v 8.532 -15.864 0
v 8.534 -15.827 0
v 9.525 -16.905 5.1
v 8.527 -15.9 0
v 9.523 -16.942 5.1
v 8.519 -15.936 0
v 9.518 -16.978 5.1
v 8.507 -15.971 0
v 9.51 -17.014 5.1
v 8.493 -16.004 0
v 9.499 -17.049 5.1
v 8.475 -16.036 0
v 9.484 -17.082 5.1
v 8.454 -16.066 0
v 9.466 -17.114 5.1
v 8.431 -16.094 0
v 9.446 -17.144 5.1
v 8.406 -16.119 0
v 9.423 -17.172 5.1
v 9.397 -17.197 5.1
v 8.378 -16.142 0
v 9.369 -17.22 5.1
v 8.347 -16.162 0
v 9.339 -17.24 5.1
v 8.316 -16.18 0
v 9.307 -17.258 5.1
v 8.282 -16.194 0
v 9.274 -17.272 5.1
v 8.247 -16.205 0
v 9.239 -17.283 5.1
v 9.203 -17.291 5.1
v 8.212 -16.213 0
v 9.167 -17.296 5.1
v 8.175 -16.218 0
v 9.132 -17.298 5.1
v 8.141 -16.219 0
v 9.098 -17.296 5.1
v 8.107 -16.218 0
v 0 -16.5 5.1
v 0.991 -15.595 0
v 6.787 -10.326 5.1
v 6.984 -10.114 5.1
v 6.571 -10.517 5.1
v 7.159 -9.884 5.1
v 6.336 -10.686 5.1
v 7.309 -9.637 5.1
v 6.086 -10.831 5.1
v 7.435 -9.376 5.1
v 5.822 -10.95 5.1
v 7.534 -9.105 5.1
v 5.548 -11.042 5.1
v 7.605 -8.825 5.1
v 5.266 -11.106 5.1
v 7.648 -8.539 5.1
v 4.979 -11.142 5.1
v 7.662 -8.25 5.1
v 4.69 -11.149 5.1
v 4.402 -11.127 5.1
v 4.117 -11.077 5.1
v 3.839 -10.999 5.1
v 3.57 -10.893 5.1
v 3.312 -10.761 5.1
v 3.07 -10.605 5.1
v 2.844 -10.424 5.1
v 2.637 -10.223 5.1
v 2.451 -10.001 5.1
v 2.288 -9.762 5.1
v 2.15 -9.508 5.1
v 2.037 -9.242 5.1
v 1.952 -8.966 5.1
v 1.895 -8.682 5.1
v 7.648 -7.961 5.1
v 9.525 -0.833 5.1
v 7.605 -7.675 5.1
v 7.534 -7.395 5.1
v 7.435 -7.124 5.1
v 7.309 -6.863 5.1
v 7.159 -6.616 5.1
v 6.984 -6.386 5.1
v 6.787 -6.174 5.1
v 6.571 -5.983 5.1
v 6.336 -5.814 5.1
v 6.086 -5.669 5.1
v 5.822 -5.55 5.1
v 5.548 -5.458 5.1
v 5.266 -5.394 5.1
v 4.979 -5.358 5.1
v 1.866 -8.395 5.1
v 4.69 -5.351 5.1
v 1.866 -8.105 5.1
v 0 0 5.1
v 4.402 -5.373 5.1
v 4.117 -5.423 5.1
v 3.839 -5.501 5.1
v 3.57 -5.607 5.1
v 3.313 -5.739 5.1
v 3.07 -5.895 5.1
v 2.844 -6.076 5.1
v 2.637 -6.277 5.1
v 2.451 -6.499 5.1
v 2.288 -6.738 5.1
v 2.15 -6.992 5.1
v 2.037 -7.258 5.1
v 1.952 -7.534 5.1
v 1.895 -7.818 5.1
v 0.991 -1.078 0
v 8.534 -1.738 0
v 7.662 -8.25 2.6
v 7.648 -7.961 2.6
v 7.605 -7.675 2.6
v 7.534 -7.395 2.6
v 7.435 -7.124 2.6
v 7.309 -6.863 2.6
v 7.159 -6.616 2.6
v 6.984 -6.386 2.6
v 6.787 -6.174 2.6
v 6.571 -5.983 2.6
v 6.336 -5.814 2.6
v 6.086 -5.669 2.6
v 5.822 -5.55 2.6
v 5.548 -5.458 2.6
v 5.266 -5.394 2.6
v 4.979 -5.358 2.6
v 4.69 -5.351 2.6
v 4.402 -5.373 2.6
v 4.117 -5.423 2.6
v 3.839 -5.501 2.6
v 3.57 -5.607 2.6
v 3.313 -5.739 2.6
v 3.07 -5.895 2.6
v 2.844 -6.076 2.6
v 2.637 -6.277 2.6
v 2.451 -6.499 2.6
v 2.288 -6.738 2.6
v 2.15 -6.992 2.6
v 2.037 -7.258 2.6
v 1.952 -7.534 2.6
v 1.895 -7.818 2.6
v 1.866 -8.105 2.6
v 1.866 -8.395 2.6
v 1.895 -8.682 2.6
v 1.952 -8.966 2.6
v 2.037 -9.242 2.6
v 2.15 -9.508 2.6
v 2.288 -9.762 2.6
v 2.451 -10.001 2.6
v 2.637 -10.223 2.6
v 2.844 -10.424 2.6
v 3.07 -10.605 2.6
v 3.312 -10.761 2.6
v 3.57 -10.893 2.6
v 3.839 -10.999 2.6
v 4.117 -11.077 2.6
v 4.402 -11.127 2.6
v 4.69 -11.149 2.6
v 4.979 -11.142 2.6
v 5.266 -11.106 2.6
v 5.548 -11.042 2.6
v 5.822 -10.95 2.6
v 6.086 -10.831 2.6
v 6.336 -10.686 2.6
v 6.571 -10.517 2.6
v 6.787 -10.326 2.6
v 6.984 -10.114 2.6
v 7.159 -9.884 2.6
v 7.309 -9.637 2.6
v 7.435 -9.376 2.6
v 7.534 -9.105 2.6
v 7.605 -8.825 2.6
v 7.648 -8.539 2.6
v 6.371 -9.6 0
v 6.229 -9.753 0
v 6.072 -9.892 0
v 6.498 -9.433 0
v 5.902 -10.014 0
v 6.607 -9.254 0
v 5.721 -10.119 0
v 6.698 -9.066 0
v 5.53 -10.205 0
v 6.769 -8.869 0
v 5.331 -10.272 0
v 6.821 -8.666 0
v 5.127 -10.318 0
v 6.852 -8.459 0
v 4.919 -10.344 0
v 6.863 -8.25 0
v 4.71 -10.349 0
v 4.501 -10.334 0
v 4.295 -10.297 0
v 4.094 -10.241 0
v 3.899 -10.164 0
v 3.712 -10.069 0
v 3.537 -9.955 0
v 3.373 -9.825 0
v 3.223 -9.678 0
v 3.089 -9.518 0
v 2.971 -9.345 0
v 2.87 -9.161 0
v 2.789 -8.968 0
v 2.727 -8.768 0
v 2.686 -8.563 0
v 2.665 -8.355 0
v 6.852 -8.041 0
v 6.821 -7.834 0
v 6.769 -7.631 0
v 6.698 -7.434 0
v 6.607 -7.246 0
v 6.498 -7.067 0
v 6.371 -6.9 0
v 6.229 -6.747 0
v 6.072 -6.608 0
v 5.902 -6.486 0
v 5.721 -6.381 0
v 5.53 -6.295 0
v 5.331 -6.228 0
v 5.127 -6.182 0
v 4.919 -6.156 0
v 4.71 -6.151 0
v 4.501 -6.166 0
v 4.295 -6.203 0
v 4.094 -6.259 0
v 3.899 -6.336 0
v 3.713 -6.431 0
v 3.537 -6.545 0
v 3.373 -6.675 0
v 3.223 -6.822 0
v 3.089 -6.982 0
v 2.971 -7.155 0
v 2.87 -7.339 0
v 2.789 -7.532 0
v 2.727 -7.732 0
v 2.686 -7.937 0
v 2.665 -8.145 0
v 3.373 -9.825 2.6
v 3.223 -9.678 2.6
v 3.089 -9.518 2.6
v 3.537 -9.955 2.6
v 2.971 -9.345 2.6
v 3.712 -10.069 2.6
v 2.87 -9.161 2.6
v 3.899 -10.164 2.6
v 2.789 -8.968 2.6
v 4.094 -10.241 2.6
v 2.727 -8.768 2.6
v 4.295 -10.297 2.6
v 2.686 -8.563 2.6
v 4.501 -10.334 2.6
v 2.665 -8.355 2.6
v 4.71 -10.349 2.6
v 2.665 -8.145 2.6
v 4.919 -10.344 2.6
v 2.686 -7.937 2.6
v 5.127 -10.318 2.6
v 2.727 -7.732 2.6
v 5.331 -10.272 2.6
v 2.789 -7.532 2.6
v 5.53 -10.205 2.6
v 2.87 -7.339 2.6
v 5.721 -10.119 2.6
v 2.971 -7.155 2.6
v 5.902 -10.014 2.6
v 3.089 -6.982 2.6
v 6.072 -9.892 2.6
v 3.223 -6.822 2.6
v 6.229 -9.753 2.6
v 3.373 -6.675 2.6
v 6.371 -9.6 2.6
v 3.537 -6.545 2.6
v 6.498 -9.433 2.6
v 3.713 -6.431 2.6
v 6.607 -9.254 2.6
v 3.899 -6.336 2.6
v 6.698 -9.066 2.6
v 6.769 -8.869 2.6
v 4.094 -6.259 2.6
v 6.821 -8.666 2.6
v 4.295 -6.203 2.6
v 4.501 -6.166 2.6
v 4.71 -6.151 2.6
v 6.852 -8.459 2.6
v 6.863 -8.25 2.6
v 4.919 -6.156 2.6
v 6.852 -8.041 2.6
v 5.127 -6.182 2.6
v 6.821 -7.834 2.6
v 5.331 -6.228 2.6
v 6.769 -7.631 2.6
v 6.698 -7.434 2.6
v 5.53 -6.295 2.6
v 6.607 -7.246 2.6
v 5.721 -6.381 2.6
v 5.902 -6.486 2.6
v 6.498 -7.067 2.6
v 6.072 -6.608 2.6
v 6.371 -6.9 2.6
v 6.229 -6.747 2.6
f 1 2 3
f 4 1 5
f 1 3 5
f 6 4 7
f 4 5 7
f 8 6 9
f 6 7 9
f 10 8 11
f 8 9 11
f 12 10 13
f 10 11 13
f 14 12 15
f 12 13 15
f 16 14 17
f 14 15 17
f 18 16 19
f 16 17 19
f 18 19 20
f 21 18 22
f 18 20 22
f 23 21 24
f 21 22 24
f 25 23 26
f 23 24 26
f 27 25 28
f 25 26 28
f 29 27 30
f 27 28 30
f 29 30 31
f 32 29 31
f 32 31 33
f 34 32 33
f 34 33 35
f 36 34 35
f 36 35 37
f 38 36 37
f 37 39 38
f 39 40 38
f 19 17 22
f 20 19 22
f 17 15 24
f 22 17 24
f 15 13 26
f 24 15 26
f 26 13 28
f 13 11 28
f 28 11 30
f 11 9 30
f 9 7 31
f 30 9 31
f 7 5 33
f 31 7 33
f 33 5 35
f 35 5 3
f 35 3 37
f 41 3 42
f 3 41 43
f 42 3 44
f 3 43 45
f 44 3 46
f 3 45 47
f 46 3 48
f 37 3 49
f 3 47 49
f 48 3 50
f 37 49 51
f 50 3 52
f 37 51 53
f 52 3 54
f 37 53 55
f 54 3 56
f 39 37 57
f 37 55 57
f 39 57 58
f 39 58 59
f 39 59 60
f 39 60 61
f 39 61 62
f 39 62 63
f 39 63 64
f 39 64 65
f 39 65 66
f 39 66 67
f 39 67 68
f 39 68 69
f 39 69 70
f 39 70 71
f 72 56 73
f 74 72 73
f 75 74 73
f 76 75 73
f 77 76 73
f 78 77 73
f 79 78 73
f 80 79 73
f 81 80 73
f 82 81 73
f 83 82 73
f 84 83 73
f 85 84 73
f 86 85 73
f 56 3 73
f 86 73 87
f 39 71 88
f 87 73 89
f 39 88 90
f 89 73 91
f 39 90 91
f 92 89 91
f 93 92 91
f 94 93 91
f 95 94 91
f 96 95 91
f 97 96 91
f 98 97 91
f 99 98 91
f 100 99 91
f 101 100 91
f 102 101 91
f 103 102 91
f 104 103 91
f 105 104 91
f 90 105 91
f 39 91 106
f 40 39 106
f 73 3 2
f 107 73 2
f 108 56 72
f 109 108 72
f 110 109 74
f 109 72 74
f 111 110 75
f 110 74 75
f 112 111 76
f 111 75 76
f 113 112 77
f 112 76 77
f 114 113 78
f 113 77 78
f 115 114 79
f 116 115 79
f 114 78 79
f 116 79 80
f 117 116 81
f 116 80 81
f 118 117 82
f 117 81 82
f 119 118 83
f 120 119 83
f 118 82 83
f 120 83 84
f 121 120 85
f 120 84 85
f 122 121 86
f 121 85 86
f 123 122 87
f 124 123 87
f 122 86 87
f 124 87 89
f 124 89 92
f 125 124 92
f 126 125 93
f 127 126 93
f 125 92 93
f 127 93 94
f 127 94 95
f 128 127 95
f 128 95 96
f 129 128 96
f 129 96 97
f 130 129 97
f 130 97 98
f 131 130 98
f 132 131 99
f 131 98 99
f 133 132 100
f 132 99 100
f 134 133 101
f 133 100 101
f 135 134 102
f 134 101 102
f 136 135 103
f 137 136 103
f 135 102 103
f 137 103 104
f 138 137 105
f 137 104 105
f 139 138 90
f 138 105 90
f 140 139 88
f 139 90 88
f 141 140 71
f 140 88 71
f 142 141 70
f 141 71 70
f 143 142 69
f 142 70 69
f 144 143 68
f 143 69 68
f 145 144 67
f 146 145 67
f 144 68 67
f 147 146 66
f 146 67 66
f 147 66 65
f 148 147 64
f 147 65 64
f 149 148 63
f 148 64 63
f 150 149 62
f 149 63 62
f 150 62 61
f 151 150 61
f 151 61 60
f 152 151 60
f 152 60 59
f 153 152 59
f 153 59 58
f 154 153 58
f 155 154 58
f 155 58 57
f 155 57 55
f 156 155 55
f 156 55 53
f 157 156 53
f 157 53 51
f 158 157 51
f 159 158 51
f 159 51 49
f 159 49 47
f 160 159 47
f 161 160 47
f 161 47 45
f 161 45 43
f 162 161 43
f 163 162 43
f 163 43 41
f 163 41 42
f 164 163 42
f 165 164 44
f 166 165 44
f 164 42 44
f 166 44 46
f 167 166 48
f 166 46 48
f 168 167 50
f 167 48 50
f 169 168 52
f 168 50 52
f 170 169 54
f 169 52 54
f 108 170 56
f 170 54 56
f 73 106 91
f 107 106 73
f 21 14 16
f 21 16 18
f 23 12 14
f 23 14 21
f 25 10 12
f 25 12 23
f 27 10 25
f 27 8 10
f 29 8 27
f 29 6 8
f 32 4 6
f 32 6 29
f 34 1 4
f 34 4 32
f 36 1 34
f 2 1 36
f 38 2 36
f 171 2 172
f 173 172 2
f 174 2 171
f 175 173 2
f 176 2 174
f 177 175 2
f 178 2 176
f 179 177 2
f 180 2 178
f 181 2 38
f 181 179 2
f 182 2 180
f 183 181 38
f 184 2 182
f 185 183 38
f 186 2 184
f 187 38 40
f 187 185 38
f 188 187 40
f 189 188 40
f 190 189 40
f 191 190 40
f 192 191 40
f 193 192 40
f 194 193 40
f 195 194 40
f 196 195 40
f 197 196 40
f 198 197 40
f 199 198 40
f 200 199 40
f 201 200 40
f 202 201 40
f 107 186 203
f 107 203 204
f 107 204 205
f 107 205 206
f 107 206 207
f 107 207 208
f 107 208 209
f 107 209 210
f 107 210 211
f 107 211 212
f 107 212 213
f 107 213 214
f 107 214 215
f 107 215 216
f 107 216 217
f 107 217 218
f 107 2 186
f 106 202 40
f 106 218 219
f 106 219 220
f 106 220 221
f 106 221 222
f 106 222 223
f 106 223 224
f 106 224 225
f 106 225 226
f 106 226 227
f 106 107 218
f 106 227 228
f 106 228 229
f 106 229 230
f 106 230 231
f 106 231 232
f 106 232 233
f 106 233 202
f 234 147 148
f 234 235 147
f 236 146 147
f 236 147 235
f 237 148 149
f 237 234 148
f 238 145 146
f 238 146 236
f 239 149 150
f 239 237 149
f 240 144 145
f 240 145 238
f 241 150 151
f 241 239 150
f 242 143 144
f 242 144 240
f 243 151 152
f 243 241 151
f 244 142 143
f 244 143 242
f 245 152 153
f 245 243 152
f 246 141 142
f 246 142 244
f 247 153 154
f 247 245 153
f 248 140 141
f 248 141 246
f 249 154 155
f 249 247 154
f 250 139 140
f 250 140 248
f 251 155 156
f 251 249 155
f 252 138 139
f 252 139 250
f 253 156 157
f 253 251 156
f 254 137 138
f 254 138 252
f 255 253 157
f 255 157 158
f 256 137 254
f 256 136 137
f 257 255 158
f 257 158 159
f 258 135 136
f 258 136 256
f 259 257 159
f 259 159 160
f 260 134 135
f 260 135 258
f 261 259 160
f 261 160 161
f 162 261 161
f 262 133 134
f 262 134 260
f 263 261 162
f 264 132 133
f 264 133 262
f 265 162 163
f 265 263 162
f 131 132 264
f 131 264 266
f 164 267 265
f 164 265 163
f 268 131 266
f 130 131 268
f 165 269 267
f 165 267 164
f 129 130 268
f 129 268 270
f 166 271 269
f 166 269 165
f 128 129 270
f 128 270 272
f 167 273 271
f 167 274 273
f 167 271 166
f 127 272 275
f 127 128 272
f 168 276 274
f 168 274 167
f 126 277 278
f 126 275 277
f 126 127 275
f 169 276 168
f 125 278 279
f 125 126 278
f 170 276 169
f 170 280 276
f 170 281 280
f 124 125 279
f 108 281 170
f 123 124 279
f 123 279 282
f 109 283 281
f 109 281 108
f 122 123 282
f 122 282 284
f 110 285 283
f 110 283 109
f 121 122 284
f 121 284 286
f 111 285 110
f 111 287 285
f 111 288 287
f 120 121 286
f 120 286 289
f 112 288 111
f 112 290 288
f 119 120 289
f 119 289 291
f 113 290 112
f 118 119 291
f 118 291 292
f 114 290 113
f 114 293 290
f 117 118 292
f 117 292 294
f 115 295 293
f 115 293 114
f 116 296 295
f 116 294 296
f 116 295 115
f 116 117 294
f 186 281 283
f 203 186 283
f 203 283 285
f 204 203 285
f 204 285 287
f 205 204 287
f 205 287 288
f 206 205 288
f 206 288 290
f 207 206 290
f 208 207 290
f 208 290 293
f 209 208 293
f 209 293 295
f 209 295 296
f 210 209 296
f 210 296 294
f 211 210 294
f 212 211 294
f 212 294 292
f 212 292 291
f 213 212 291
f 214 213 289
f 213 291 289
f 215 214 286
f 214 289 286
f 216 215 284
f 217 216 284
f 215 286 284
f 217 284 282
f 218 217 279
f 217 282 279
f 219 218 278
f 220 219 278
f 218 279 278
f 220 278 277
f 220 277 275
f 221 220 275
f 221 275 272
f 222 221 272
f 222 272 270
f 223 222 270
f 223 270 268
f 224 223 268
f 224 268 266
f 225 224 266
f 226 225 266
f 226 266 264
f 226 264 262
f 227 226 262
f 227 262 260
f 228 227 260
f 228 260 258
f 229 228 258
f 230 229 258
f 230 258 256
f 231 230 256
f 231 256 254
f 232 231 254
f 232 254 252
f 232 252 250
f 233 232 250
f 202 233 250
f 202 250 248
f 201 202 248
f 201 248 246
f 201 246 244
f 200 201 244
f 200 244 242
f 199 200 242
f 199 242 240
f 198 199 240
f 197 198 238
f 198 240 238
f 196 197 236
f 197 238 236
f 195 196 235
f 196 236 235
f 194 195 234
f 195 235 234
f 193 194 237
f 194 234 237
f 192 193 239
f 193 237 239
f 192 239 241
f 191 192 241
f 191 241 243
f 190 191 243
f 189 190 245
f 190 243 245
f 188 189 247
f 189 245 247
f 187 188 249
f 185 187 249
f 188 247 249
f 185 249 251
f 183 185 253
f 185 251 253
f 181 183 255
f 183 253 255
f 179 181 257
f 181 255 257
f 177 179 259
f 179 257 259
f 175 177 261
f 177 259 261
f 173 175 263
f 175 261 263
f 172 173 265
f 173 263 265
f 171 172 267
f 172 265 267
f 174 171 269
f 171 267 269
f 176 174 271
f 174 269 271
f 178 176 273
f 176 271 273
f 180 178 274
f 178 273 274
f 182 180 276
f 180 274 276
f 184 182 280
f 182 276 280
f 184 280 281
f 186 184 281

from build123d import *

# Parameters (mm, degrees)
EXTRUDE_1_DEPTH     = 5.1
CUT_EXTRUDE_1_DEPTH = 10
SWEEP_START         = -0.969556918
SWEEP_2_OUTLINE_W   = 12
SWEEP_2_OUTLINE_H   = 9
SWEEP_2_DEPTH       = 0.969556918
SWEEP_START_2       = -16.13744627
SWEEP_3_OUTLINE_W   = 12
SWEEP_3_OUTLINE_H   = 9
SWEEP_3_DEPTH       = 0.969556918
FILLET_2_R          = 0.4
SKETCH_13_R         = 2.9
CUT_EXTRUDE_3_DEPTH = 2.5
SKETCH_14_R         = 2.1
CUT_EXTRUDE_4_DEPTH = 20.917083723


# Read off the part's stored shape, not the designer's step: 切除-扫描2, 切除-扫描3
with BuildPart() as part:
    # 草图1 → 凸台-拉伸1 (new body)
    with BuildSketch(Plane.XY):
        Polygon((0, 0), (9.525, -0.83332952), (9.525, -17.33332952), (0, -16.5), align=None)
    extrude(amount=EXTRUDE_1_DEPTH)

    # 草图4 → 切除-拉伸1 (cut, symmetric)
    with BuildSketch(Plane(origin=(0, -8.25, 0), x_dir=(1, 0, 0), z_dir=(0, 1, 0))):
        Polygon((0, -5.1), (0.991339577, 0), (0, 0), align=None)
        Polygon((9.525, -5.1), (8.533660423, 0), (9.525, 0), align=None)
    extrude(amount=CUT_EXTRUDE_1_DEPTH, both=True, mode=Mode.SUBTRACT)

    # 切除-扫描2 outline → 切除-扫描2 (cut)
    with BuildSketch(Plane(origin=(0, 0, 0), x_dir=(0.9963324805819772, -0.08399418565625866, 0.016326815773634484), z_dir=(0.08556627920719848, 0.9780270466911105, -0.19010919968086795)).offset(SWEEP_START)):
        with Locations((5, -2.5)):
            Rectangle(SWEEP_2_OUTLINE_W, SWEEP_2_OUTLINE_H)
    extrude(amount=SWEEP_2_DEPTH, mode=Mode.SUBTRACT)

    # 切除-扫描3 outline → 切除-扫描3 (cut)
    with BuildSketch(Plane(origin=(0, 0, 0), x_dir=(0.9963324805819772, -0.08399418565625832, -0.016326815773633797), z_dir=(0.08556627920719802, 0.978027046691112, 0.190109199680861)).offset(SWEEP_START_2)):
        with Locations((6, -5.5)):
            Rectangle(SWEEP_3_OUTLINE_W, SWEEP_3_OUTLINE_H)
    extrude(amount=SWEEP_3_DEPTH, mode=Mode.SUBTRACT)

    # 圆角2
    fillet_2_edges = [part.edges().sort_by_distance(p)[0] for p in [
        (9.029330212, -16.794294244, 2.55),
    ]]
    fillet(fillet_2_edges, radius=FILLET_2_R)

    # 草图13 → 切除-拉伸3 (cut)
    with BuildSketch(Plane.XY.offset(5.1)):
        with Locations((4.7625, -8.25)):
            Circle(SKETCH_13_R)
    extrude(amount=-CUT_EXTRUDE_3_DEPTH, mode=Mode.SUBTRACT)

    # 草图14 → 切除-拉伸4 (cut, through all)
    with BuildSketch(Plane.XY.offset(2.6)):
        with Locations((4.7625, -8.25)):
            Circle(SKETCH_14_R)
    extrude(amount=-CUT_EXTRUDE_4_DEPTH, mode=Mode.SUBTRACT)


solid = part.part
